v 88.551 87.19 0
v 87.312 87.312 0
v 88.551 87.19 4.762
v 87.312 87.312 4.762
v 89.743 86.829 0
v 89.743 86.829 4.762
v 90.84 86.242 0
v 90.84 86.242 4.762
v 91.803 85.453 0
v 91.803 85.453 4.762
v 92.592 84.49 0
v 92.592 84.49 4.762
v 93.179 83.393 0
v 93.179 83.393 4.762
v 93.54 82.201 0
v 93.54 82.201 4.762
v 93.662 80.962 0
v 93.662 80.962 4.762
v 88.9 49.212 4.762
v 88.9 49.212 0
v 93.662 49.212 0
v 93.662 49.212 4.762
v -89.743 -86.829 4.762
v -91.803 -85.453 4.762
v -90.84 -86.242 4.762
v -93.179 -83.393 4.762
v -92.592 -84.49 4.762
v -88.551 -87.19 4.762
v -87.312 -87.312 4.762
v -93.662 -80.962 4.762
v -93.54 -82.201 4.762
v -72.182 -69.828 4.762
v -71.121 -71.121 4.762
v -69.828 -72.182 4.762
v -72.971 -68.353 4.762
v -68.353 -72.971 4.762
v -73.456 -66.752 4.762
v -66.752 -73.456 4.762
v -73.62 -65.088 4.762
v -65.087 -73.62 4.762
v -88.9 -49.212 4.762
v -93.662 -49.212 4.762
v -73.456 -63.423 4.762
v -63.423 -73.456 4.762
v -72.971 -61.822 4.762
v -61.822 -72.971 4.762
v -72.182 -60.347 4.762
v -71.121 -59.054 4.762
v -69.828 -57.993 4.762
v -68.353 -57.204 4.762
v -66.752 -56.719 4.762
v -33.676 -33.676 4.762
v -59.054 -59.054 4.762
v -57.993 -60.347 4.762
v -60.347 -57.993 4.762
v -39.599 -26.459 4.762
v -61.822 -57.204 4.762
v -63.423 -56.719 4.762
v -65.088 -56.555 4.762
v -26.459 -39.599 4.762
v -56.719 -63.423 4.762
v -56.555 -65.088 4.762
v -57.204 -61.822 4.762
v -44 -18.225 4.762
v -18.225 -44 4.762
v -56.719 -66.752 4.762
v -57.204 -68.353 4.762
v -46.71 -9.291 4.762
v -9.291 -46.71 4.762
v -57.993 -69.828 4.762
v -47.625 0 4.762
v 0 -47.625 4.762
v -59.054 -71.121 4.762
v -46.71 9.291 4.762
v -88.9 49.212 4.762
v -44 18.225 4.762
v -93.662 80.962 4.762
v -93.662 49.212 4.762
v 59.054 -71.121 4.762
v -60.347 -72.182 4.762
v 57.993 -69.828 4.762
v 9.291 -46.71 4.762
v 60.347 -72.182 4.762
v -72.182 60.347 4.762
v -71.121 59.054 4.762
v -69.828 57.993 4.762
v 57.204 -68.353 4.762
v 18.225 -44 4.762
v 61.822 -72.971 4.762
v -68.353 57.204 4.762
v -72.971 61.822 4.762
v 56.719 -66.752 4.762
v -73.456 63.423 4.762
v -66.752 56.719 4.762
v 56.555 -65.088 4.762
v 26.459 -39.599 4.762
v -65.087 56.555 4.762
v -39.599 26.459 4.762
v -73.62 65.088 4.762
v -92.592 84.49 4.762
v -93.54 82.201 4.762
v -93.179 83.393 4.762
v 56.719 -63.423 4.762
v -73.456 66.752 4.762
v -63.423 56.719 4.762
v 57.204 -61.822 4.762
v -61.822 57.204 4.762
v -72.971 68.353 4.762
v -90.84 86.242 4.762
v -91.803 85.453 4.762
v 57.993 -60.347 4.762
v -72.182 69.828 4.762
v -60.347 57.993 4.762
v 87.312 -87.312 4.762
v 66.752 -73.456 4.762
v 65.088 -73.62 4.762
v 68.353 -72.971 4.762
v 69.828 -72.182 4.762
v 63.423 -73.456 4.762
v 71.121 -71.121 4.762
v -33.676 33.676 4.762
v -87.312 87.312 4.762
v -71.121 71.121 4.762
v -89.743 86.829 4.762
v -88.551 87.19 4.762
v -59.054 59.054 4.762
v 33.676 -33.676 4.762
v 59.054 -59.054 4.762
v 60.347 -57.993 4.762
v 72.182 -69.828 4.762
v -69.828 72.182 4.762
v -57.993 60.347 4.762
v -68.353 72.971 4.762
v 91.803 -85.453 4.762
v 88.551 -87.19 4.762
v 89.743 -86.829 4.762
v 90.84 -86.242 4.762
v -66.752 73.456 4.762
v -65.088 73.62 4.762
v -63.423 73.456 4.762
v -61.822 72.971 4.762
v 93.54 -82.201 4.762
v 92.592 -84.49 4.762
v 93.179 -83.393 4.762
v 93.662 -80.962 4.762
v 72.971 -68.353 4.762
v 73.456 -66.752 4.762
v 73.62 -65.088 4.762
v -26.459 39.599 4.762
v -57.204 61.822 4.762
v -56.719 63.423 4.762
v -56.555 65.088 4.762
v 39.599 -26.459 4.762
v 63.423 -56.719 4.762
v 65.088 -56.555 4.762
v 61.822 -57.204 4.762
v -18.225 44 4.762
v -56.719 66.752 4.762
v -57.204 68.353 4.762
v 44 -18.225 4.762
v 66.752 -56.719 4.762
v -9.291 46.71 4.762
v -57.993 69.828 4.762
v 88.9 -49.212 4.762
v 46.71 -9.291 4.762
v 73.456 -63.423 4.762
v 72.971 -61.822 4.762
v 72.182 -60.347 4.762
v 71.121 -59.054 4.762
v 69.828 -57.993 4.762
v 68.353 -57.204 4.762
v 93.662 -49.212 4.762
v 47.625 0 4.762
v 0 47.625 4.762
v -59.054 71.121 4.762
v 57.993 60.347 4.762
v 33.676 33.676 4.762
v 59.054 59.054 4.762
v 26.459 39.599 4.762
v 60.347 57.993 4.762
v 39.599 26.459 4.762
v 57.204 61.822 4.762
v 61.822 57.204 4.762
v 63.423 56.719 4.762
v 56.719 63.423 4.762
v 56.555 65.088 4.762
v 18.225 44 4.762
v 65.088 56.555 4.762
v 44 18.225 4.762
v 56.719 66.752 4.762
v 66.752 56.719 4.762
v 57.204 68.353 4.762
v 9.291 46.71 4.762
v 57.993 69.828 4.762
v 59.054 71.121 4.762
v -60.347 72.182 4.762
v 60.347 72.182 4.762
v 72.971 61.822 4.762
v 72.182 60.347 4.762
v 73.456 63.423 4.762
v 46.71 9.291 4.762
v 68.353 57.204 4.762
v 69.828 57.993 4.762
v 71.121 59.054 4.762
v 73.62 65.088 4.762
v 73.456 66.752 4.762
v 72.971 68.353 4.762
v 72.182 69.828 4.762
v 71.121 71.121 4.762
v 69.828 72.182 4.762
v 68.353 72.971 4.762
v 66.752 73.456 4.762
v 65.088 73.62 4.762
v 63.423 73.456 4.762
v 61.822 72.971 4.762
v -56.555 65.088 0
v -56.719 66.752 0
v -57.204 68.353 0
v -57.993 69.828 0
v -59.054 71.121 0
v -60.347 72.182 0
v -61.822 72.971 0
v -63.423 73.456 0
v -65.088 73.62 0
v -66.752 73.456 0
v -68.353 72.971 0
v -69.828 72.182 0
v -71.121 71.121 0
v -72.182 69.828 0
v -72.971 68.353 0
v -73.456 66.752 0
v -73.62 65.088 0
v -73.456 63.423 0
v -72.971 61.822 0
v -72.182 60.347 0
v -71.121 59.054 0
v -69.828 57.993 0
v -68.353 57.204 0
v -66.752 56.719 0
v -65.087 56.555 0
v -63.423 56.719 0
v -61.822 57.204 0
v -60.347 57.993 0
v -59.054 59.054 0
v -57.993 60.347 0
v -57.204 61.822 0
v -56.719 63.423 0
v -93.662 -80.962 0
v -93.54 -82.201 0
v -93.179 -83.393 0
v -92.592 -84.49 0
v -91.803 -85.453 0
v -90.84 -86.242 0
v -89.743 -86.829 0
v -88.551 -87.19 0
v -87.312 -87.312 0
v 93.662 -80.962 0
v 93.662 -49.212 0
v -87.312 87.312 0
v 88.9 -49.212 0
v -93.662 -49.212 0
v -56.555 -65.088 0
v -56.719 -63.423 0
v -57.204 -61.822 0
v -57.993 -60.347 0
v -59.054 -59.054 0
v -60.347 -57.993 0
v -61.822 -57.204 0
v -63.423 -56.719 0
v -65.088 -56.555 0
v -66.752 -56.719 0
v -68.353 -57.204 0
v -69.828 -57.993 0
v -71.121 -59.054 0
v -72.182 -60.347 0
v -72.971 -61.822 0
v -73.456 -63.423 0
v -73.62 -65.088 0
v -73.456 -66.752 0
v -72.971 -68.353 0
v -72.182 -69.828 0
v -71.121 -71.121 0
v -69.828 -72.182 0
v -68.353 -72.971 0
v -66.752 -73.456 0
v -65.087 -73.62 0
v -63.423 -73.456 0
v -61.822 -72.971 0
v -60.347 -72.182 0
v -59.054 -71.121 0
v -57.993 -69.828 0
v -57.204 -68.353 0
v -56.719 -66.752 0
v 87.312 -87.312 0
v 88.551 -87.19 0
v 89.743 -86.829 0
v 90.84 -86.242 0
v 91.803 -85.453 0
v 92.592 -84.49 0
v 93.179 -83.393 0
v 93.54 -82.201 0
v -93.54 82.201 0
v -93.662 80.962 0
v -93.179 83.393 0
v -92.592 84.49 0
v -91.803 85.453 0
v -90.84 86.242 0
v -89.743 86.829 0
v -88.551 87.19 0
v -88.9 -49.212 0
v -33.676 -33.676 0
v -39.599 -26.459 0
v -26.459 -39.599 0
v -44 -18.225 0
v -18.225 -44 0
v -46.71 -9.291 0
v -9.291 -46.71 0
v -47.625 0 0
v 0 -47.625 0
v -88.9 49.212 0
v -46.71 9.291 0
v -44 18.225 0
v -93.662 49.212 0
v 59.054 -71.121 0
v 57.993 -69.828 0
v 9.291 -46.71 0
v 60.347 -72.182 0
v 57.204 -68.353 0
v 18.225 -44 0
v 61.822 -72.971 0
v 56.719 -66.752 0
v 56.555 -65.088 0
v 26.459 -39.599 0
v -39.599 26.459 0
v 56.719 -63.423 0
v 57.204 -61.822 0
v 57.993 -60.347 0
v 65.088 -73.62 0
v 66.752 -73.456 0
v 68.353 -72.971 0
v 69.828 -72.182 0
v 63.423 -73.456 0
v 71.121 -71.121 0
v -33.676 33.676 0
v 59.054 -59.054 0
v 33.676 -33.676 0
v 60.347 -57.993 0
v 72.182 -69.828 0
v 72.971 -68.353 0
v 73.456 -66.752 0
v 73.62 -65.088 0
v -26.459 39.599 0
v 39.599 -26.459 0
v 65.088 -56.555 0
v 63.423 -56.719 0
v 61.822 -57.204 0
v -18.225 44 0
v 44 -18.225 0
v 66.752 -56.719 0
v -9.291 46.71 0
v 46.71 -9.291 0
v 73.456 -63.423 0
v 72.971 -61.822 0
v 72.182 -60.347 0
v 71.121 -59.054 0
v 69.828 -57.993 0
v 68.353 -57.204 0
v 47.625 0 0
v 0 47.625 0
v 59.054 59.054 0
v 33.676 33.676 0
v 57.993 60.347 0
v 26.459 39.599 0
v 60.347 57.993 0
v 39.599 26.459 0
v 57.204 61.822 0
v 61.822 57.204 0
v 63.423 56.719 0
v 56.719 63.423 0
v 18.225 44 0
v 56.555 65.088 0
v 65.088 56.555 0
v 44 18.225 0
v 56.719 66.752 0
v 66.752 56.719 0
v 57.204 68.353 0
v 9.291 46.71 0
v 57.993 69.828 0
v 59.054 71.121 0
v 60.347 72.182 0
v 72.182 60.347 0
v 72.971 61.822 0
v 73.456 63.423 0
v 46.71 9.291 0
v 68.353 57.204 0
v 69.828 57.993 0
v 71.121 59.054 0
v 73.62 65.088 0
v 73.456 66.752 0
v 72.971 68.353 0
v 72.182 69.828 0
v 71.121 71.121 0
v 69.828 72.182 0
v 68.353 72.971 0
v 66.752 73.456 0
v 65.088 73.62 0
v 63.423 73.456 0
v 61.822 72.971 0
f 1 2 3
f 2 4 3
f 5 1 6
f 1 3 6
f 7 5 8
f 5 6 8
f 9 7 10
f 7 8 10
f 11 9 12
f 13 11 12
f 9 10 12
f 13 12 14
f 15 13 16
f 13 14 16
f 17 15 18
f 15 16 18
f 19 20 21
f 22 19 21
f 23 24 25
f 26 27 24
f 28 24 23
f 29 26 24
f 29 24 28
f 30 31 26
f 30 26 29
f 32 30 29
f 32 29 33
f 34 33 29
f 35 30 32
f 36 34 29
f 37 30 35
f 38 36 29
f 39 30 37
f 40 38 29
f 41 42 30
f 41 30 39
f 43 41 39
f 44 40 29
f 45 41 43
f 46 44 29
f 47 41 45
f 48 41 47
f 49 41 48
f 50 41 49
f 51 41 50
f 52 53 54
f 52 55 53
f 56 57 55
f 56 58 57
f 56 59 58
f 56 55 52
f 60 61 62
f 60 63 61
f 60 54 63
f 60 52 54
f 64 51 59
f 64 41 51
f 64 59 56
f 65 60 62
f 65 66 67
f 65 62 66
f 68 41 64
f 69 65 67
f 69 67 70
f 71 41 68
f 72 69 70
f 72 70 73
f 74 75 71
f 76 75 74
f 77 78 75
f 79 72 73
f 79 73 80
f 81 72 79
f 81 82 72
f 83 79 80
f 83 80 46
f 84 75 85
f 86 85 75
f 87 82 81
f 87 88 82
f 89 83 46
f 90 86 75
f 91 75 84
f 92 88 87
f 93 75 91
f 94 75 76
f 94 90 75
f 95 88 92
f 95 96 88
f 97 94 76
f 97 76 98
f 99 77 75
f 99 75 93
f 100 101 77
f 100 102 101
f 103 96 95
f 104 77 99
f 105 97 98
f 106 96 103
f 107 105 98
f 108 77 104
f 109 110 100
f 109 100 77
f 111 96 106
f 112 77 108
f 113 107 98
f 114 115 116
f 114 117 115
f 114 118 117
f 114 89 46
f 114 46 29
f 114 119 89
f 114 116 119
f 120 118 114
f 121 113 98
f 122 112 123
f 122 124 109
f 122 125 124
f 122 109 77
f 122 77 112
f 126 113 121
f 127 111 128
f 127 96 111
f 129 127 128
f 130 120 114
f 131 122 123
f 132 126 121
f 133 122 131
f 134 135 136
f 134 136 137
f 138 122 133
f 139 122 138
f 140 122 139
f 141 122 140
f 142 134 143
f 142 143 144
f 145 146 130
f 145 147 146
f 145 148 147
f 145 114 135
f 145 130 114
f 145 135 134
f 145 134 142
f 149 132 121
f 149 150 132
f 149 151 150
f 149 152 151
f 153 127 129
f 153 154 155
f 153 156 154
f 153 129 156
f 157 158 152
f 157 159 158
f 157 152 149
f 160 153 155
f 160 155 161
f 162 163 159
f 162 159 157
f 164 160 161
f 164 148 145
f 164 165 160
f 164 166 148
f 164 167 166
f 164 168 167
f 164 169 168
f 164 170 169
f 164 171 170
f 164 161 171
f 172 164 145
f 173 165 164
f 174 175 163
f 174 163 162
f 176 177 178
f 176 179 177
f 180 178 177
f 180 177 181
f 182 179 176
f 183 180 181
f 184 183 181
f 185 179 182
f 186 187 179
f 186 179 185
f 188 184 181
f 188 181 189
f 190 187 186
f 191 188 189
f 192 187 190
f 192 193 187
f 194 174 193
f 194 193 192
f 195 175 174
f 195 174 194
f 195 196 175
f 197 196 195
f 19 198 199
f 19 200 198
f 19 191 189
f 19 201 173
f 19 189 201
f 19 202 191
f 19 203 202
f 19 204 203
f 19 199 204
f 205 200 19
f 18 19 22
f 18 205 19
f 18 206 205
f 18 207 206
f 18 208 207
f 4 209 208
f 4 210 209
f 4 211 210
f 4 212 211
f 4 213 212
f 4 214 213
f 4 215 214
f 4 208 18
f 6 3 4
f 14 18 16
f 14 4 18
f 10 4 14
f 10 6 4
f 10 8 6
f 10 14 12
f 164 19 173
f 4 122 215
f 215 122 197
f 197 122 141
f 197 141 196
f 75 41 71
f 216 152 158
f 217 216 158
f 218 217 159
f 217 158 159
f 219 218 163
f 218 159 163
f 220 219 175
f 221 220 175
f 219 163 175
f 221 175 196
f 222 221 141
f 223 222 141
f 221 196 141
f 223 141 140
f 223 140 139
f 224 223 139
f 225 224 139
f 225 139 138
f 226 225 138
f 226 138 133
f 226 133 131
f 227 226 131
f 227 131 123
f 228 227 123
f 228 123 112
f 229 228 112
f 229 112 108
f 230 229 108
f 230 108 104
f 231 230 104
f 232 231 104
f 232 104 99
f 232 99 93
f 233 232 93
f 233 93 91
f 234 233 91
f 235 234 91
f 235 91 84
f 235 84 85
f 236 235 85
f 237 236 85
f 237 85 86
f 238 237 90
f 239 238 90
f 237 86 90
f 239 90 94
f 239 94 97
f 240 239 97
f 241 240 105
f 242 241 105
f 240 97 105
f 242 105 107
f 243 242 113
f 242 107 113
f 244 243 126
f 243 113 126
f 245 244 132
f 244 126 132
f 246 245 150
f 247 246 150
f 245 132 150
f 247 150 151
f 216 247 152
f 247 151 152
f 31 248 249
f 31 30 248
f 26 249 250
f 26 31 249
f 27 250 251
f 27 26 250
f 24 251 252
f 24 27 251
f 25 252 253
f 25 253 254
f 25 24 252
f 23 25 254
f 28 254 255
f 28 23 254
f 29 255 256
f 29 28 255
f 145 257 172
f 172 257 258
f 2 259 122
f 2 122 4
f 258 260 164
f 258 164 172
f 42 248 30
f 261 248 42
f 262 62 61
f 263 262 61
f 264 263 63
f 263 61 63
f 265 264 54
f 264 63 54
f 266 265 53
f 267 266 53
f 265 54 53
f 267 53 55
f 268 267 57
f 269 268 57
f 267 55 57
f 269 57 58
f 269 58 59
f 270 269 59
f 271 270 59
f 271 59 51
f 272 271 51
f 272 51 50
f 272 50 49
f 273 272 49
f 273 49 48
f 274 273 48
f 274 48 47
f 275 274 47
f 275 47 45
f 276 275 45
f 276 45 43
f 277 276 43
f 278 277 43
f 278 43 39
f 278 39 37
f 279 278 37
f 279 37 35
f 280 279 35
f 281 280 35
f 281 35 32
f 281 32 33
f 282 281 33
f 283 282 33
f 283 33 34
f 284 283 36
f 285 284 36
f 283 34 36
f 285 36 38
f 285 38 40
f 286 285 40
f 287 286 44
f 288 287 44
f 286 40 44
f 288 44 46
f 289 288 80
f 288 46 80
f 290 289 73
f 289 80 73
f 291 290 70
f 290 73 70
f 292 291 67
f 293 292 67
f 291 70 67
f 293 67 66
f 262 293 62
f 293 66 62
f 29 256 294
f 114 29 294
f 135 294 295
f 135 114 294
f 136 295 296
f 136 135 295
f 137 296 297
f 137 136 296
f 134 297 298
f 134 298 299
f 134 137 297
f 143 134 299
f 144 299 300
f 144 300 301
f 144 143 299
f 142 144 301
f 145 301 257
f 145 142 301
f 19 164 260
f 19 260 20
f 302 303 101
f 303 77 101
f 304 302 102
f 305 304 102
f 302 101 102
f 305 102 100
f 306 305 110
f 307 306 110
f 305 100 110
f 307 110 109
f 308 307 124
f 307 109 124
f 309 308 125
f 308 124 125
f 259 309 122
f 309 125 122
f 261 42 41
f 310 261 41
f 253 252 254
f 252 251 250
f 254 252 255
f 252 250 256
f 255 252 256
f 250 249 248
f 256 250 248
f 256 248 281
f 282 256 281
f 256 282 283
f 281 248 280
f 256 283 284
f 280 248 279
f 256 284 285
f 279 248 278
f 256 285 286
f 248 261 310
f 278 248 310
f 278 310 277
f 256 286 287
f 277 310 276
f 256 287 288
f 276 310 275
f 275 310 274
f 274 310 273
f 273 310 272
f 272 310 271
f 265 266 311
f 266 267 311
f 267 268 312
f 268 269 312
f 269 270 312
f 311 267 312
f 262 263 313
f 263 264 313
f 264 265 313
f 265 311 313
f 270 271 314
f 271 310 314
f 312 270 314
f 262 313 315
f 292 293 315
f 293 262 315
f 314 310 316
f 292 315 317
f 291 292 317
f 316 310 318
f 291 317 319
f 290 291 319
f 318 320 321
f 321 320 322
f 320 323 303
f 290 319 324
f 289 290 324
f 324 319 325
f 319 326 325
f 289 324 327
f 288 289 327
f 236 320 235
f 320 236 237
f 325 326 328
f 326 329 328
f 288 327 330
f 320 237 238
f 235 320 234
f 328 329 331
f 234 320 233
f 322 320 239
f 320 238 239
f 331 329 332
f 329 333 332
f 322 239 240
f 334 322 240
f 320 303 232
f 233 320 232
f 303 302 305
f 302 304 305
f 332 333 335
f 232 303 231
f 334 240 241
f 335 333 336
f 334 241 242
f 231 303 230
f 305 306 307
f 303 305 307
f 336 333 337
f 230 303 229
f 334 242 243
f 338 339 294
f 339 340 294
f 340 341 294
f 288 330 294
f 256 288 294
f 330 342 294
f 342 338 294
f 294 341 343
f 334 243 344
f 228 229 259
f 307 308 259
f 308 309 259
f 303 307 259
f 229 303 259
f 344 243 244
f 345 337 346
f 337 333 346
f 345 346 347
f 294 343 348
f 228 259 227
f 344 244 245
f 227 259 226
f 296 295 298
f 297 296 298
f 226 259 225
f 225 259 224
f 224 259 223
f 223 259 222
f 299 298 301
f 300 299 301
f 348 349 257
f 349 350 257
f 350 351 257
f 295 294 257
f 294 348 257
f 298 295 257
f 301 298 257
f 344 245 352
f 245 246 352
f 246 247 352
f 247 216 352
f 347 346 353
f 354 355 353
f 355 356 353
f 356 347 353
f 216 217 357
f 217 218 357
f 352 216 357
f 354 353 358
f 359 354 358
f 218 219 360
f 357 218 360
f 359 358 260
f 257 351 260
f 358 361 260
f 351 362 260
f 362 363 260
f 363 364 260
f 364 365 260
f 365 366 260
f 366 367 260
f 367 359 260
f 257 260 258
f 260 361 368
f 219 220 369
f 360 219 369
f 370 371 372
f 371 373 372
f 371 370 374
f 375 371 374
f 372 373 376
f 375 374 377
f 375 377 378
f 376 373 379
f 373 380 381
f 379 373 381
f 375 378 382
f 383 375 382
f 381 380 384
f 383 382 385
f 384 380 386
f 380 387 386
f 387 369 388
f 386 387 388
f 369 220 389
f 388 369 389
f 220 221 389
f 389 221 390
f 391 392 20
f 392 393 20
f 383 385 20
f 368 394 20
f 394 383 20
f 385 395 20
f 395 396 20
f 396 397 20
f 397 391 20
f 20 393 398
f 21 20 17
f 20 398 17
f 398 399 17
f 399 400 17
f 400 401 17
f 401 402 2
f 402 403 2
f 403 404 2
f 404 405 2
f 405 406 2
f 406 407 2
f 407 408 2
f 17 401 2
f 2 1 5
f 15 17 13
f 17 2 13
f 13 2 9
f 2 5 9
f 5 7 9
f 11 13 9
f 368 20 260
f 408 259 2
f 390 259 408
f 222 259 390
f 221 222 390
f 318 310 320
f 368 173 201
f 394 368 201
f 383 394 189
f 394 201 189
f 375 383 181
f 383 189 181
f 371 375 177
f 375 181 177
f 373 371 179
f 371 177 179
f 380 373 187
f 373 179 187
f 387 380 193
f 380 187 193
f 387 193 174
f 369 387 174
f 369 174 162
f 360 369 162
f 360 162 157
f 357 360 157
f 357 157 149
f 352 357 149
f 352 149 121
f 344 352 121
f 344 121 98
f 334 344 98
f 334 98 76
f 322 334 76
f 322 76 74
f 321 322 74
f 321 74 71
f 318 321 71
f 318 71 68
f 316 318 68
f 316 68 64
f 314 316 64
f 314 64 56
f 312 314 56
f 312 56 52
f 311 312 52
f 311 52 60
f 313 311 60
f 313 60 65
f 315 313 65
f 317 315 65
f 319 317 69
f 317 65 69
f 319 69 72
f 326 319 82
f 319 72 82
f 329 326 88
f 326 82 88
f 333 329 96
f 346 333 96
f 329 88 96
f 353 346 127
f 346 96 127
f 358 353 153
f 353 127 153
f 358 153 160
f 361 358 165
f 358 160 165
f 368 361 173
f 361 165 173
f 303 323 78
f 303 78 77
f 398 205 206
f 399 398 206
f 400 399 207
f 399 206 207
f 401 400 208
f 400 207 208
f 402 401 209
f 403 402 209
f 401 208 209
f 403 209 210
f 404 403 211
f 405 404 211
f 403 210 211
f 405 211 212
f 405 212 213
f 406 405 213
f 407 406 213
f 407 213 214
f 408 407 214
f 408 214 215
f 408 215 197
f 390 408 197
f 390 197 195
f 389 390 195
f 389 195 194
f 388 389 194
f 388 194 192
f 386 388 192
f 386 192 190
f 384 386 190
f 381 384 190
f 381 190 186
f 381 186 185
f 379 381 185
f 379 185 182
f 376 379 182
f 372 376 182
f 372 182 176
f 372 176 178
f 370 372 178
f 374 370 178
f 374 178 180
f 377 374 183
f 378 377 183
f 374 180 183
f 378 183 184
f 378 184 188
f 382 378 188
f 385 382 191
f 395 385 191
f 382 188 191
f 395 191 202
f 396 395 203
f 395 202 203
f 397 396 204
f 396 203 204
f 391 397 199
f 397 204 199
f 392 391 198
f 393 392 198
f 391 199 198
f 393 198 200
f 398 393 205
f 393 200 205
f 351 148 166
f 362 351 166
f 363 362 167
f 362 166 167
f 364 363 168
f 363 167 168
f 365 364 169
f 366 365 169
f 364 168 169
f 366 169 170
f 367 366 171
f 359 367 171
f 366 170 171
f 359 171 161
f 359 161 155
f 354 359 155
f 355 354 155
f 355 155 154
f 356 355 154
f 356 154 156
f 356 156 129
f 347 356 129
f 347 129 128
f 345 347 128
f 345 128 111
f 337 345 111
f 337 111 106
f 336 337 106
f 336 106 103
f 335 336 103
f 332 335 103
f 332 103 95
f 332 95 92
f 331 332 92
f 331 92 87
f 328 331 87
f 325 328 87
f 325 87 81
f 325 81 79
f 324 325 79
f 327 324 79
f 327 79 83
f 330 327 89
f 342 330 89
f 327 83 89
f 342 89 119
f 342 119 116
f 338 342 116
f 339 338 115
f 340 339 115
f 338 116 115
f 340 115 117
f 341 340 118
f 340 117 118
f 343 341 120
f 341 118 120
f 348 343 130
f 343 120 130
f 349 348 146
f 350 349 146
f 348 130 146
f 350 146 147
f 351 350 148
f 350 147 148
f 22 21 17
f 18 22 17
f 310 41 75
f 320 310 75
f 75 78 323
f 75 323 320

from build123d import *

# Parameters (mm, degrees)
SKETCH1_W          = 187.325
SKETCH1_H          = 174.625
EXTRUDE1_DEPTH     = 4.7625
CUT_EXTRUDE1_REACH = 130.136
SKETCH2_W          = 4.7625
SKETCH2_H          = 98.425
FILLET1_R          = 6.35
CUT_EXTRUDE2_REACH = 130.136
SKETCH3_R          = 47.625
SKETCH3_R_2        = 8.5328125


with BuildPart() as part:
    # Sketch1 → Extrude1 (new body)
    with BuildSketch(Plane.XY):
        Rectangle(SKETCH1_W, SKETCH1_H)
    extrude(amount=EXTRUDE1_DEPTH)

    # Sketch2 → Cut-Extrude1 (cut, up to next)
    with BuildSketch(Plane.XY.offset(4.7625), mode=Mode.PRIVATE) as cut_extrude1_sk1:
        with Locations((-91.28125, 0)):
            Rectangle(SKETCH2_W, SKETCH2_H)
    cut_extrude1_tool1 = extrude(cut_extrude1_sk1.sketch, amount=-CUT_EXTRUDE1_REACH, mode=Mode.PRIVATE) & part.part
    # Sketch2 → Cut-Extrude1 (cut, up to next)
    with BuildSketch(Plane.XY.offset(4.7625), mode=Mode.PRIVATE) as cut_extrude1_sk2:
        with Locations((91.28125, 0)):
            Rectangle(SKETCH2_W, SKETCH2_H)
    cut_extrude1_tool2 = extrude(cut_extrude1_sk2.sketch, amount=-CUT_EXTRUDE1_REACH, mode=Mode.PRIVATE) & part.part
    add(cut_extrude1_tool1.solids().sort_by_distance((-91.28125, 0, 4.7625))[0], mode=Mode.SUBTRACT)
    add(cut_extrude1_tool2.solids().sort_by_distance((91.28125, 0, 4.7625))[0], mode=Mode.SUBTRACT)

    # Fillet1
    fillet1_edges = [part.edges().sort_by_distance(p)[0] for p in [
        (-93.6625, 87.3125, 2.38125),
        (93.6625, 87.3125, 2.38125),
        (93.6625, -87.3125, 2.38125),
        (-93.6625, -87.3125, 2.38125),
    ]]
    fillet(fillet1_edges, radius=FILLET1_R)

    # Sketch3 → Cut-Extrude2 (cut, up to next)
    with BuildSketch(Plane.XY.offset(4.7625), mode=Mode.PRIVATE) as cut_extrude2_sk1:
        Circle(SKETCH3_R)
    cut_extrude2_tool1 = extrude(cut_extrude2_sk1.sketch, amount=-CUT_EXTRUDE2_REACH, mode=Mode.PRIVATE) & part.part
    # Sketch3 → Cut-Extrude2 (cut, up to next)
    with BuildSketch(Plane.XY.offset(4.7625), mode=Mode.PRIVATE) as cut_extrude2_sk2:
        with Locations((-65.0875, 65.0875)):
            Circle(SKETCH3_R_2)
    cut_extrude2_tool2 = extrude(cut_extrude2_sk2.sketch, amount=-CUT_EXTRUDE2_REACH, mode=Mode.PRIVATE) & part.part
    # Sketch3 → Cut-Extrude2 (cut, up to next)
    with BuildSketch(Plane.XY.offset(4.7625), mode=Mode.PRIVATE) as cut_extrude2_sk3:
        with Locations((-65.0875, -65.0875)):
            Circle(SKETCH3_R_2)
    cut_extrude2_tool3 = extrude(cut_extrude2_sk3.sketch, amount=-CUT_EXTRUDE2_REACH, mode=Mode.PRIVATE) & part.part
    # Sketch3 → Cut-Extrude2 (cut, up to next)
    with BuildSketch(Plane.XY.offset(4.7625), mode=Mode.PRIVATE) as cut_extrude2_sk4:
        with Locations((65.0875, -65.0875)):
            Circle(SKETCH3_R_2)
    cut_extrude2_tool4 = extrude(cut_extrude2_sk4.sketch, amount=-CUT_EXTRUDE2_REACH, mode=Mode.PRIVATE) & part.part
    # Sketch3 → Cut-Extrude2 (cut, up to next)
    with BuildSketch(Plane.XY.offset(4.7625), mode=Mode.PRIVATE) as cut_extrude2_sk5:
        with Locations((65.0875, 65.0875)):
            Circle(SKETCH3_R_2)
    cut_extrude2_tool5 = extrude(cut_extrude2_sk5.sketch, amount=-CUT_EXTRUDE2_REACH, mode=Mode.PRIVATE) & part.part
    add(cut_extrude2_tool1.solids().sort_by_distance((0, 0, 4.7625))[0], mode=Mode.SUBTRACT)
    add(cut_extrude2_tool2.solids().sort_by_distance((-65.0875, 65.0875, 4.7625))[0], mode=Mode.SUBTRACT)
    add(cut_extrude2_tool3.solids().sort_by_distance((-65.0875, -65.0875, 4.7625))[0], mode=Mode.SUBTRACT)
    add(cut_extrude2_tool4.solids().sort_by_distance((65.0875, -65.0875, 4.7625))[0], mode=Mode.SUBTRACT)
    add(cut_extrude2_tool5.solids().sort_by_distance((65.0875, 65.0875, 4.7625))[0], mode=Mode.SUBTRACT)


solid = part.part
